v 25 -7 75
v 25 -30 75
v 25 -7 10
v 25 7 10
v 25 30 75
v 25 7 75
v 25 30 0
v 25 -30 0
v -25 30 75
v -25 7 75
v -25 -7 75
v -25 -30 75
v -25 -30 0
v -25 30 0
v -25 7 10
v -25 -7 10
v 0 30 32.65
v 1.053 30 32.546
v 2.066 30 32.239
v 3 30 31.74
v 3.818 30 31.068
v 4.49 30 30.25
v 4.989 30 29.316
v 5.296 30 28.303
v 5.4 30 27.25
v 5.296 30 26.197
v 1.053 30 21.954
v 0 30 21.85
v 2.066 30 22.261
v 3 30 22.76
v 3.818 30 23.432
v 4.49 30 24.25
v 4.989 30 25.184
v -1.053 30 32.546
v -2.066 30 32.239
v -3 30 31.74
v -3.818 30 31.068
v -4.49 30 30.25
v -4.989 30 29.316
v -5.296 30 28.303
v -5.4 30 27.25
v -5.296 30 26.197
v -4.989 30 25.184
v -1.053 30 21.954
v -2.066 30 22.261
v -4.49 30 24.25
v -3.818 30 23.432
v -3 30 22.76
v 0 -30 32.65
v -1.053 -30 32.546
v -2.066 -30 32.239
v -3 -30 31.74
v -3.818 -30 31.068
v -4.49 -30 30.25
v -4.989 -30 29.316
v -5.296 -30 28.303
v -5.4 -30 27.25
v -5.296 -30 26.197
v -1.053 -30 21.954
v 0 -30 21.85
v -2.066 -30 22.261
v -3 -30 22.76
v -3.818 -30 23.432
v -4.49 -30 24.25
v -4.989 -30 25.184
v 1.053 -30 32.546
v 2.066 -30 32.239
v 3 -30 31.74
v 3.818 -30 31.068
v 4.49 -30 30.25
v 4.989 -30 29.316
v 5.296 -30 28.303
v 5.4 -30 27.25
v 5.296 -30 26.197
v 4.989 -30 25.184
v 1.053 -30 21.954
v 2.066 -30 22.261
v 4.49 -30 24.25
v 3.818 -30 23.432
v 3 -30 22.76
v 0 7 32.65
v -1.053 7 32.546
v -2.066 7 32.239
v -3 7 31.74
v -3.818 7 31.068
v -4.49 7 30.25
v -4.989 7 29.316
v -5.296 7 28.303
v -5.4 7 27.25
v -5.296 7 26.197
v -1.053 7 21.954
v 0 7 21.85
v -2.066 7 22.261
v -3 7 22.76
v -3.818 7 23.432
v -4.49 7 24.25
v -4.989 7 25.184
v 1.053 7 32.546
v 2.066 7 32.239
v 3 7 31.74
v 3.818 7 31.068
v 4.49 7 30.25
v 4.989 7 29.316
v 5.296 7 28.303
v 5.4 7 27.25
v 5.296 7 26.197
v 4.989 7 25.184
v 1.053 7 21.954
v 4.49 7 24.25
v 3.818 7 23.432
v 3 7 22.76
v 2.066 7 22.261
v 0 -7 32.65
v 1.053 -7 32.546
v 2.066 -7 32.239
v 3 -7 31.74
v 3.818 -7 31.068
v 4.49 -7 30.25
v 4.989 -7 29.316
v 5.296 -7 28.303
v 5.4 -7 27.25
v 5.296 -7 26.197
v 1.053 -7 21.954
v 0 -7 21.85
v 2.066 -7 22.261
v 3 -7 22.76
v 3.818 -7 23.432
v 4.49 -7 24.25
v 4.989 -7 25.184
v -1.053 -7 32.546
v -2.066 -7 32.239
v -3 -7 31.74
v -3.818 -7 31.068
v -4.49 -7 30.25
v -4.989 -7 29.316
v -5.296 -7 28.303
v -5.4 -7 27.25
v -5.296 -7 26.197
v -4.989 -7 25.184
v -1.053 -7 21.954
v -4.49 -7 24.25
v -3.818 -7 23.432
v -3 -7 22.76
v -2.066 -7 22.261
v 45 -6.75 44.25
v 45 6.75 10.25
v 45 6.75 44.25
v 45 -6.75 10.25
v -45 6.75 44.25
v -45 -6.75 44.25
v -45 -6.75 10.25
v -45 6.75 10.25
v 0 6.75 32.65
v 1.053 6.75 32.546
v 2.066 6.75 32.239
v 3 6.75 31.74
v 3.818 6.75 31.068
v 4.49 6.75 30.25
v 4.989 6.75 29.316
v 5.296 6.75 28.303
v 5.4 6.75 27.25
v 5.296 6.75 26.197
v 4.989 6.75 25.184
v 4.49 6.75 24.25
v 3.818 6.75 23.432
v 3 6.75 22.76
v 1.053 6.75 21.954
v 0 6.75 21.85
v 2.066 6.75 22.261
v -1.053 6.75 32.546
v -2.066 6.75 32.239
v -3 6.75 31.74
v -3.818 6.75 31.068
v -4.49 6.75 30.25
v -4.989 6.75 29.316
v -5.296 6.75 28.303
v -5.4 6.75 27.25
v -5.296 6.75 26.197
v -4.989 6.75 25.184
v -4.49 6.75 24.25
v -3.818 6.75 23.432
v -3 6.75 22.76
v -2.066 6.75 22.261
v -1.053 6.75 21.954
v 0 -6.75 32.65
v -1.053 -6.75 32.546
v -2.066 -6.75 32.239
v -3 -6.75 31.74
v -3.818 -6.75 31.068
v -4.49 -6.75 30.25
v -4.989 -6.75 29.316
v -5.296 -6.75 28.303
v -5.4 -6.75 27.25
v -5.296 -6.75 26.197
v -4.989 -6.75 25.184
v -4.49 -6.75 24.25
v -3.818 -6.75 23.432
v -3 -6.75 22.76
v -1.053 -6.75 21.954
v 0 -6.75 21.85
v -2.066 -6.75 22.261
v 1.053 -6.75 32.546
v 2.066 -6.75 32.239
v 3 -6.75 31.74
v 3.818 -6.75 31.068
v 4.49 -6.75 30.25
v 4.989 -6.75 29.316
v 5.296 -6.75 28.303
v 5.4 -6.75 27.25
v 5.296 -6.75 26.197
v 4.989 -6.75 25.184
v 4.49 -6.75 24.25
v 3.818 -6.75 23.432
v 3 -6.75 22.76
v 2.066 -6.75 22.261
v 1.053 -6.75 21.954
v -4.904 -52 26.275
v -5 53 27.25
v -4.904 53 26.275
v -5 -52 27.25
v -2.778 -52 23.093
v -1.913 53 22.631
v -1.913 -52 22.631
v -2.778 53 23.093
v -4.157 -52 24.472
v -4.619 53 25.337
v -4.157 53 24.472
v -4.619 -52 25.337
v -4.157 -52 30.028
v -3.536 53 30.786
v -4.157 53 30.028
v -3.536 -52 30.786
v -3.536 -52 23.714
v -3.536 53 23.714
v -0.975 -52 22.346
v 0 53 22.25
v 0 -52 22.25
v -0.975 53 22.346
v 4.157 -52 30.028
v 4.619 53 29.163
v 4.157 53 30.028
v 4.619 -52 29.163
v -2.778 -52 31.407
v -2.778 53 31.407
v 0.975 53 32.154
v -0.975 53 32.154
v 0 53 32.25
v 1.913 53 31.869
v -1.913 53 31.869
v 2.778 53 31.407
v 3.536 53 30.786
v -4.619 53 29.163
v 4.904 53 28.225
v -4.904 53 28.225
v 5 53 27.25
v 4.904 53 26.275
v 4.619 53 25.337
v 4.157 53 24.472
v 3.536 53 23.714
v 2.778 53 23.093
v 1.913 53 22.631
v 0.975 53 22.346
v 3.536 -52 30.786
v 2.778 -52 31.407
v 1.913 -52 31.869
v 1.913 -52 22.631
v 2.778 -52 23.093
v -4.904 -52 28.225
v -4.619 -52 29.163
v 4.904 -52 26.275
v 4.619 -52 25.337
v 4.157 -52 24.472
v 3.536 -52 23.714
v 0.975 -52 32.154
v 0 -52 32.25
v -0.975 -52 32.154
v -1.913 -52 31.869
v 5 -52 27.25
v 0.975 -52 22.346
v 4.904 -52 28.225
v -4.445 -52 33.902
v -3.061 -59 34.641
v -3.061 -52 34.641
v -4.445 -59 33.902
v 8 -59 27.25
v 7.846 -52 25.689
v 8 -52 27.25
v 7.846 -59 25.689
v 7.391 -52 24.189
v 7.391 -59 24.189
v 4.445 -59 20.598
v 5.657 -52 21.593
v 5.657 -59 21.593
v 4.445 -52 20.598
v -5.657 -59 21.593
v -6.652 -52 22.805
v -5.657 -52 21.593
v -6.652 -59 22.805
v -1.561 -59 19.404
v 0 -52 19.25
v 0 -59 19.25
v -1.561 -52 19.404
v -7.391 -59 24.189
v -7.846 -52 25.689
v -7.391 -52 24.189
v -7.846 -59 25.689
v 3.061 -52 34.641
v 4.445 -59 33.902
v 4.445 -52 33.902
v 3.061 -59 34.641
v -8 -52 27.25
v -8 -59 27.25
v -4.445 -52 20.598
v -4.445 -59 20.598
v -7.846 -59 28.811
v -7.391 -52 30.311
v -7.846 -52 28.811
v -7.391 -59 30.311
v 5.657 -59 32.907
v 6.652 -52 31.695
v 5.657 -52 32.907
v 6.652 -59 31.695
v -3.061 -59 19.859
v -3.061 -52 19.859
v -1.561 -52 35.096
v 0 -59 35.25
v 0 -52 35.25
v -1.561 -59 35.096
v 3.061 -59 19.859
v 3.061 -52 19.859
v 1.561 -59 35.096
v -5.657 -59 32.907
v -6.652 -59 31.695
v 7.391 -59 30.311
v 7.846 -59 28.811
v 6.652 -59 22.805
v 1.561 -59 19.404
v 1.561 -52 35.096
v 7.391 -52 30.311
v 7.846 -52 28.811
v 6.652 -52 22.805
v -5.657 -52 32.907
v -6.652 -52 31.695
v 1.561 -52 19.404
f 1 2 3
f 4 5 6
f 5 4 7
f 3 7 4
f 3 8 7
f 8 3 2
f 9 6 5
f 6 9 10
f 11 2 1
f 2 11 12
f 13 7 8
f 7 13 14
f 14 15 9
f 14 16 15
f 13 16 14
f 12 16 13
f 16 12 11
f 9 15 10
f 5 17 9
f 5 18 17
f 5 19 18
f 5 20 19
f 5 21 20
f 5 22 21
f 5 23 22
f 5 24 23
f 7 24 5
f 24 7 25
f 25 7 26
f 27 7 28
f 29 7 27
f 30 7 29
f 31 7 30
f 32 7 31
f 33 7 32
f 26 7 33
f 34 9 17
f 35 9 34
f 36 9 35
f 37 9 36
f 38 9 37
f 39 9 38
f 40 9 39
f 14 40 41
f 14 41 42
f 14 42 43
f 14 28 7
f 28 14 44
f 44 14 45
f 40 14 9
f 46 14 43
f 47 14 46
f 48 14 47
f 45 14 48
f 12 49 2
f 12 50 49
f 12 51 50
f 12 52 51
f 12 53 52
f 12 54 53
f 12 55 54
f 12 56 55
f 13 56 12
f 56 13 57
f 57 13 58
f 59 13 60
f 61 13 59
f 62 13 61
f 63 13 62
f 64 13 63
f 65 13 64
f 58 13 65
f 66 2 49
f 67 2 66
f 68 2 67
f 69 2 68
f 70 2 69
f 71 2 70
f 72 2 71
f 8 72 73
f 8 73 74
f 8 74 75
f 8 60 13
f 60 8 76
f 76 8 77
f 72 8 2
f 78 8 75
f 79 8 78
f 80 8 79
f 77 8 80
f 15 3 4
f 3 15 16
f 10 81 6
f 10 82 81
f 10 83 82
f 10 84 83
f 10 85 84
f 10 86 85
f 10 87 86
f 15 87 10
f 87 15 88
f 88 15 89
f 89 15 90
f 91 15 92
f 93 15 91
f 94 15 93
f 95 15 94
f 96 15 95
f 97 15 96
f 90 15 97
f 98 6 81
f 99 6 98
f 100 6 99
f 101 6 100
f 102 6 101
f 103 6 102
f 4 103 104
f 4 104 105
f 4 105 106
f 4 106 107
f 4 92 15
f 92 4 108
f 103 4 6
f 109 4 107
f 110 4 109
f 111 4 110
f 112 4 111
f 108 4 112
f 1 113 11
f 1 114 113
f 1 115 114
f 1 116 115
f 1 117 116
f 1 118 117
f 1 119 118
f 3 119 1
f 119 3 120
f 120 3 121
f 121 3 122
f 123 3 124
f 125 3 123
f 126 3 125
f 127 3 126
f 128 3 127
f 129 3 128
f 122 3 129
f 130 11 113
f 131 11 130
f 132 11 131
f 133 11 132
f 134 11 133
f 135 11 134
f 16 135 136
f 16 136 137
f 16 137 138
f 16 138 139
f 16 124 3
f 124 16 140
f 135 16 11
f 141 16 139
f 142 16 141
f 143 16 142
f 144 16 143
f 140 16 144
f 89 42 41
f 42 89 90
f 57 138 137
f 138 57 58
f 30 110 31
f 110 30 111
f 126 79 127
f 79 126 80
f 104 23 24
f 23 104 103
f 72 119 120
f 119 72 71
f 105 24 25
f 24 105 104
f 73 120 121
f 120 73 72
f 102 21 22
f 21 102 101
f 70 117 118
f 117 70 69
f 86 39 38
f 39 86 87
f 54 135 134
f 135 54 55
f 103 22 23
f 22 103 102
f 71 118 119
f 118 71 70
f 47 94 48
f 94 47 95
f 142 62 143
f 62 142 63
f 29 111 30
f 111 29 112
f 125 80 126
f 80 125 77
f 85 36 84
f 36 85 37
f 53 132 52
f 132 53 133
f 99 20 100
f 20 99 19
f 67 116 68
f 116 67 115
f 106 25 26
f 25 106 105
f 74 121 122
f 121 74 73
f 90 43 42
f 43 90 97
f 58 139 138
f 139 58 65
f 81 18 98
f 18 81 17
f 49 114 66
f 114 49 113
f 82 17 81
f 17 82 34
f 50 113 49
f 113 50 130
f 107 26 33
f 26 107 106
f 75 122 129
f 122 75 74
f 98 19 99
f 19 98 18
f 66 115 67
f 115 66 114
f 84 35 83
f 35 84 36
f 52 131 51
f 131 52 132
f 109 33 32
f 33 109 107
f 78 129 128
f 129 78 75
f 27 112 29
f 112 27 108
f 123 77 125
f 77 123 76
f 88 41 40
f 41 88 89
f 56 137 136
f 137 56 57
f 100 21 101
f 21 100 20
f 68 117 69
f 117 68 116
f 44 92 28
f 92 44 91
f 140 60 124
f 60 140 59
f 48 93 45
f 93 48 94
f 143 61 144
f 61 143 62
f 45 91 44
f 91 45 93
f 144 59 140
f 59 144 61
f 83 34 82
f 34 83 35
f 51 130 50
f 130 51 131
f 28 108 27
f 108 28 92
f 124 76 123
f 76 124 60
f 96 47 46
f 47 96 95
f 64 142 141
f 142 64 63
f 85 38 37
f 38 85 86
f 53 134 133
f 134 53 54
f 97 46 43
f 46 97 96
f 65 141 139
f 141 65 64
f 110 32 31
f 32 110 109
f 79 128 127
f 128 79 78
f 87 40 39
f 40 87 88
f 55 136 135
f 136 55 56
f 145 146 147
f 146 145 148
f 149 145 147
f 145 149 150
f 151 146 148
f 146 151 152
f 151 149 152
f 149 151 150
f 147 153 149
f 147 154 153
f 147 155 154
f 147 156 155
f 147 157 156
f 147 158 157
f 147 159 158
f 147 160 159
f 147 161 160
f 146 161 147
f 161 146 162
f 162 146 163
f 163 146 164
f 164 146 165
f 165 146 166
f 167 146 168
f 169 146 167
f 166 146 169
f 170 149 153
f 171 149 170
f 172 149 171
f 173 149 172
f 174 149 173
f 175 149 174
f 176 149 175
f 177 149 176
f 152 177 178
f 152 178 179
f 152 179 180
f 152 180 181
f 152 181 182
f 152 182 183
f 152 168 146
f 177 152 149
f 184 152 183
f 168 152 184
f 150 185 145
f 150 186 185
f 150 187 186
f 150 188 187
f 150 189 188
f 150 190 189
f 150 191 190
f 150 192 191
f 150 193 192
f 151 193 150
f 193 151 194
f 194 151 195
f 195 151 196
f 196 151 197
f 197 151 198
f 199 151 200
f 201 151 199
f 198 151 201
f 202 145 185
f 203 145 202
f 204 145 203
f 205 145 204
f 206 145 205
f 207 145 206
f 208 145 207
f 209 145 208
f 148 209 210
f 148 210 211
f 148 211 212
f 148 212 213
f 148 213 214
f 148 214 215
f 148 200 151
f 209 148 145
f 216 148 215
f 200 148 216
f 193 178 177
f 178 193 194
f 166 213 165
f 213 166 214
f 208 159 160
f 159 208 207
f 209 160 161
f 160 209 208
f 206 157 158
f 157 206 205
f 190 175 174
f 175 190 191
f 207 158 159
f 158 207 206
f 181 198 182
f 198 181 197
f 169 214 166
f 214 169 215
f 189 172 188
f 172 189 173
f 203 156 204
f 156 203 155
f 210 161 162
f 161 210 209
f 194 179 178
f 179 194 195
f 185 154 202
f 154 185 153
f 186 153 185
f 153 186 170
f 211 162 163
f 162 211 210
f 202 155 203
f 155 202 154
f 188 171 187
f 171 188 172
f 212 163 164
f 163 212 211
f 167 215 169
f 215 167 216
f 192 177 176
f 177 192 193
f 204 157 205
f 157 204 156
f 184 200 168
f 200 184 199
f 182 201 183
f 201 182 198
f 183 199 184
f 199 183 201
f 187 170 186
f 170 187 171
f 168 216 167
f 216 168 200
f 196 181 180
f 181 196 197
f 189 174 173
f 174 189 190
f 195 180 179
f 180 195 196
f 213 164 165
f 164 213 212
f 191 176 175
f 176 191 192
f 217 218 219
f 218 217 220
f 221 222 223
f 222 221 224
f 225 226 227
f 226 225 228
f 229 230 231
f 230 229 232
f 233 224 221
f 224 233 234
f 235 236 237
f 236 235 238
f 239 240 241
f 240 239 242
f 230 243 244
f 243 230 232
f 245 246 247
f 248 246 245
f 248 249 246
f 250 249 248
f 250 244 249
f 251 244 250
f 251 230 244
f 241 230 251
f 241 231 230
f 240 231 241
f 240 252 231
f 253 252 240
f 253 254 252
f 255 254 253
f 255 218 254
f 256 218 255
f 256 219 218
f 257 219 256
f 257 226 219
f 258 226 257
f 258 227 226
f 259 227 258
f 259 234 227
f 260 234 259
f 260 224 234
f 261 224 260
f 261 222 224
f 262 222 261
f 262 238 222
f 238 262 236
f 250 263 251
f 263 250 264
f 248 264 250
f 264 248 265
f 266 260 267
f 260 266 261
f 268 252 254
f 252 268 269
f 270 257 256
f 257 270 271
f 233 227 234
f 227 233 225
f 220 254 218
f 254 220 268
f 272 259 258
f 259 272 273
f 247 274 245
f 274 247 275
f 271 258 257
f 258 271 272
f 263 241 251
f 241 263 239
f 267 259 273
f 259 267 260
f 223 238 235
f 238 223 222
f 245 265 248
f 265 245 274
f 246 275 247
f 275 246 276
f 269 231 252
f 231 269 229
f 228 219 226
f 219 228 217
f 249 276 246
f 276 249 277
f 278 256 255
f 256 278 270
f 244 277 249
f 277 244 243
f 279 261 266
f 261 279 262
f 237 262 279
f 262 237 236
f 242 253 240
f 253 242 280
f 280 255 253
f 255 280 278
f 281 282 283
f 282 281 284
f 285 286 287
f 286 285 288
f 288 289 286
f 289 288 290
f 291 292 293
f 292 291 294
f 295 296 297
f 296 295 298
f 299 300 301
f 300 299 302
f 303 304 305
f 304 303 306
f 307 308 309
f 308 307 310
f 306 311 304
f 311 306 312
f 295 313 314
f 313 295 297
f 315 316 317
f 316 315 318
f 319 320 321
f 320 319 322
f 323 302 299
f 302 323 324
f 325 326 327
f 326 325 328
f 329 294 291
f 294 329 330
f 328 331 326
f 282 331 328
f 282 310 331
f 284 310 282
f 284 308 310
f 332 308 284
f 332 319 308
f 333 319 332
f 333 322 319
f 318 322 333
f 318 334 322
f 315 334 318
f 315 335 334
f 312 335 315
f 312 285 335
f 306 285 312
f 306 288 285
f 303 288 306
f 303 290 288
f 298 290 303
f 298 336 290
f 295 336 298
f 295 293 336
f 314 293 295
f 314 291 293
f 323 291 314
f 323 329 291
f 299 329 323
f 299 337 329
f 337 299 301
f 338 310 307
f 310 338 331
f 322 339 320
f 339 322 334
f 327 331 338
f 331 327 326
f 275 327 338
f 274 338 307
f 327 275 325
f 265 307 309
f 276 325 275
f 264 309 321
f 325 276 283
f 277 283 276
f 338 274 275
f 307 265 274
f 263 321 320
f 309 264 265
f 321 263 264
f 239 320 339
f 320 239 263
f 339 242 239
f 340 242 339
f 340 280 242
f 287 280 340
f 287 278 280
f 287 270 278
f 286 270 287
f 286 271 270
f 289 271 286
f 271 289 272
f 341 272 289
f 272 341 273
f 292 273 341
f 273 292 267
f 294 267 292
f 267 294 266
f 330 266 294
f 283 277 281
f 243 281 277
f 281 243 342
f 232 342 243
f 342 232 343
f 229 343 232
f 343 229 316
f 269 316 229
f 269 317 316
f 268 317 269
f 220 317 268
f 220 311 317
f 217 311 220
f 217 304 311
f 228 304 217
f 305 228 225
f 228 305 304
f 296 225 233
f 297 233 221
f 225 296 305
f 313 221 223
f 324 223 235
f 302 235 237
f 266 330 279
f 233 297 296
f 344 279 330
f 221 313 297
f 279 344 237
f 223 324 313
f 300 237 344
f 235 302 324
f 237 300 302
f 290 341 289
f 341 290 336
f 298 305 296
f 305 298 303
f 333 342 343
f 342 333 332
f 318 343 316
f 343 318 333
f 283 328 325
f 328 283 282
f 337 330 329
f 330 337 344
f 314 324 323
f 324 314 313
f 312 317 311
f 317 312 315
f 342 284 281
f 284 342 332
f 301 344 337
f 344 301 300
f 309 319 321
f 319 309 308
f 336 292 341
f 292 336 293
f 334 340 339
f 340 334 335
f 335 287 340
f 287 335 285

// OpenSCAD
$fn = 32;

// ------------------------------------------------------------------------
// Clevis joint: 50 mm clevis, pin d10
// Every part is its own module, assembly() places them once.
// ------------------------------------------------------------------------

// --- part 1 ---
module clevis() {
  difference() {
    translate([-25, -30, 0]) cube([50, 60, 75]);
    translate([-26, -7, 10]) cube([52, 14, 66]);
    translate([0, 0, 27.25]) rotate([90, 0, 0]) cylinder(h = 62, d = 10.8, center = true);
  }
}

// --- part 2 ---
module eye() {
  difference() {
    translate([-45, -6.75, 0]) cube([90, 13.5, 34]);
    translate([0, 0, 17]) rotate([90, 0, 0]) cylinder(h = 15.5, d = 10.8, center = true);
  }
}

// --- part 3 ---
module pin() {
  rotate([0, 90, 0]) cylinder(h = 106, d = 10, center = true);
  translate([-59, 0, 0]) rotate([0, 90, 0]) cylinder(h = 7, d = 16);
}

// --- assembly ---
module assembly() {
  translate([0, 0, 0]) rotate([0, 0, 0]) clevis();
  translate([0, 0, 10.25]) rotate([0, 0, 0]) eye();
  translate([0, 0, 27.25]) rotate([0, 0, 90]) pin();
}

assembly();
